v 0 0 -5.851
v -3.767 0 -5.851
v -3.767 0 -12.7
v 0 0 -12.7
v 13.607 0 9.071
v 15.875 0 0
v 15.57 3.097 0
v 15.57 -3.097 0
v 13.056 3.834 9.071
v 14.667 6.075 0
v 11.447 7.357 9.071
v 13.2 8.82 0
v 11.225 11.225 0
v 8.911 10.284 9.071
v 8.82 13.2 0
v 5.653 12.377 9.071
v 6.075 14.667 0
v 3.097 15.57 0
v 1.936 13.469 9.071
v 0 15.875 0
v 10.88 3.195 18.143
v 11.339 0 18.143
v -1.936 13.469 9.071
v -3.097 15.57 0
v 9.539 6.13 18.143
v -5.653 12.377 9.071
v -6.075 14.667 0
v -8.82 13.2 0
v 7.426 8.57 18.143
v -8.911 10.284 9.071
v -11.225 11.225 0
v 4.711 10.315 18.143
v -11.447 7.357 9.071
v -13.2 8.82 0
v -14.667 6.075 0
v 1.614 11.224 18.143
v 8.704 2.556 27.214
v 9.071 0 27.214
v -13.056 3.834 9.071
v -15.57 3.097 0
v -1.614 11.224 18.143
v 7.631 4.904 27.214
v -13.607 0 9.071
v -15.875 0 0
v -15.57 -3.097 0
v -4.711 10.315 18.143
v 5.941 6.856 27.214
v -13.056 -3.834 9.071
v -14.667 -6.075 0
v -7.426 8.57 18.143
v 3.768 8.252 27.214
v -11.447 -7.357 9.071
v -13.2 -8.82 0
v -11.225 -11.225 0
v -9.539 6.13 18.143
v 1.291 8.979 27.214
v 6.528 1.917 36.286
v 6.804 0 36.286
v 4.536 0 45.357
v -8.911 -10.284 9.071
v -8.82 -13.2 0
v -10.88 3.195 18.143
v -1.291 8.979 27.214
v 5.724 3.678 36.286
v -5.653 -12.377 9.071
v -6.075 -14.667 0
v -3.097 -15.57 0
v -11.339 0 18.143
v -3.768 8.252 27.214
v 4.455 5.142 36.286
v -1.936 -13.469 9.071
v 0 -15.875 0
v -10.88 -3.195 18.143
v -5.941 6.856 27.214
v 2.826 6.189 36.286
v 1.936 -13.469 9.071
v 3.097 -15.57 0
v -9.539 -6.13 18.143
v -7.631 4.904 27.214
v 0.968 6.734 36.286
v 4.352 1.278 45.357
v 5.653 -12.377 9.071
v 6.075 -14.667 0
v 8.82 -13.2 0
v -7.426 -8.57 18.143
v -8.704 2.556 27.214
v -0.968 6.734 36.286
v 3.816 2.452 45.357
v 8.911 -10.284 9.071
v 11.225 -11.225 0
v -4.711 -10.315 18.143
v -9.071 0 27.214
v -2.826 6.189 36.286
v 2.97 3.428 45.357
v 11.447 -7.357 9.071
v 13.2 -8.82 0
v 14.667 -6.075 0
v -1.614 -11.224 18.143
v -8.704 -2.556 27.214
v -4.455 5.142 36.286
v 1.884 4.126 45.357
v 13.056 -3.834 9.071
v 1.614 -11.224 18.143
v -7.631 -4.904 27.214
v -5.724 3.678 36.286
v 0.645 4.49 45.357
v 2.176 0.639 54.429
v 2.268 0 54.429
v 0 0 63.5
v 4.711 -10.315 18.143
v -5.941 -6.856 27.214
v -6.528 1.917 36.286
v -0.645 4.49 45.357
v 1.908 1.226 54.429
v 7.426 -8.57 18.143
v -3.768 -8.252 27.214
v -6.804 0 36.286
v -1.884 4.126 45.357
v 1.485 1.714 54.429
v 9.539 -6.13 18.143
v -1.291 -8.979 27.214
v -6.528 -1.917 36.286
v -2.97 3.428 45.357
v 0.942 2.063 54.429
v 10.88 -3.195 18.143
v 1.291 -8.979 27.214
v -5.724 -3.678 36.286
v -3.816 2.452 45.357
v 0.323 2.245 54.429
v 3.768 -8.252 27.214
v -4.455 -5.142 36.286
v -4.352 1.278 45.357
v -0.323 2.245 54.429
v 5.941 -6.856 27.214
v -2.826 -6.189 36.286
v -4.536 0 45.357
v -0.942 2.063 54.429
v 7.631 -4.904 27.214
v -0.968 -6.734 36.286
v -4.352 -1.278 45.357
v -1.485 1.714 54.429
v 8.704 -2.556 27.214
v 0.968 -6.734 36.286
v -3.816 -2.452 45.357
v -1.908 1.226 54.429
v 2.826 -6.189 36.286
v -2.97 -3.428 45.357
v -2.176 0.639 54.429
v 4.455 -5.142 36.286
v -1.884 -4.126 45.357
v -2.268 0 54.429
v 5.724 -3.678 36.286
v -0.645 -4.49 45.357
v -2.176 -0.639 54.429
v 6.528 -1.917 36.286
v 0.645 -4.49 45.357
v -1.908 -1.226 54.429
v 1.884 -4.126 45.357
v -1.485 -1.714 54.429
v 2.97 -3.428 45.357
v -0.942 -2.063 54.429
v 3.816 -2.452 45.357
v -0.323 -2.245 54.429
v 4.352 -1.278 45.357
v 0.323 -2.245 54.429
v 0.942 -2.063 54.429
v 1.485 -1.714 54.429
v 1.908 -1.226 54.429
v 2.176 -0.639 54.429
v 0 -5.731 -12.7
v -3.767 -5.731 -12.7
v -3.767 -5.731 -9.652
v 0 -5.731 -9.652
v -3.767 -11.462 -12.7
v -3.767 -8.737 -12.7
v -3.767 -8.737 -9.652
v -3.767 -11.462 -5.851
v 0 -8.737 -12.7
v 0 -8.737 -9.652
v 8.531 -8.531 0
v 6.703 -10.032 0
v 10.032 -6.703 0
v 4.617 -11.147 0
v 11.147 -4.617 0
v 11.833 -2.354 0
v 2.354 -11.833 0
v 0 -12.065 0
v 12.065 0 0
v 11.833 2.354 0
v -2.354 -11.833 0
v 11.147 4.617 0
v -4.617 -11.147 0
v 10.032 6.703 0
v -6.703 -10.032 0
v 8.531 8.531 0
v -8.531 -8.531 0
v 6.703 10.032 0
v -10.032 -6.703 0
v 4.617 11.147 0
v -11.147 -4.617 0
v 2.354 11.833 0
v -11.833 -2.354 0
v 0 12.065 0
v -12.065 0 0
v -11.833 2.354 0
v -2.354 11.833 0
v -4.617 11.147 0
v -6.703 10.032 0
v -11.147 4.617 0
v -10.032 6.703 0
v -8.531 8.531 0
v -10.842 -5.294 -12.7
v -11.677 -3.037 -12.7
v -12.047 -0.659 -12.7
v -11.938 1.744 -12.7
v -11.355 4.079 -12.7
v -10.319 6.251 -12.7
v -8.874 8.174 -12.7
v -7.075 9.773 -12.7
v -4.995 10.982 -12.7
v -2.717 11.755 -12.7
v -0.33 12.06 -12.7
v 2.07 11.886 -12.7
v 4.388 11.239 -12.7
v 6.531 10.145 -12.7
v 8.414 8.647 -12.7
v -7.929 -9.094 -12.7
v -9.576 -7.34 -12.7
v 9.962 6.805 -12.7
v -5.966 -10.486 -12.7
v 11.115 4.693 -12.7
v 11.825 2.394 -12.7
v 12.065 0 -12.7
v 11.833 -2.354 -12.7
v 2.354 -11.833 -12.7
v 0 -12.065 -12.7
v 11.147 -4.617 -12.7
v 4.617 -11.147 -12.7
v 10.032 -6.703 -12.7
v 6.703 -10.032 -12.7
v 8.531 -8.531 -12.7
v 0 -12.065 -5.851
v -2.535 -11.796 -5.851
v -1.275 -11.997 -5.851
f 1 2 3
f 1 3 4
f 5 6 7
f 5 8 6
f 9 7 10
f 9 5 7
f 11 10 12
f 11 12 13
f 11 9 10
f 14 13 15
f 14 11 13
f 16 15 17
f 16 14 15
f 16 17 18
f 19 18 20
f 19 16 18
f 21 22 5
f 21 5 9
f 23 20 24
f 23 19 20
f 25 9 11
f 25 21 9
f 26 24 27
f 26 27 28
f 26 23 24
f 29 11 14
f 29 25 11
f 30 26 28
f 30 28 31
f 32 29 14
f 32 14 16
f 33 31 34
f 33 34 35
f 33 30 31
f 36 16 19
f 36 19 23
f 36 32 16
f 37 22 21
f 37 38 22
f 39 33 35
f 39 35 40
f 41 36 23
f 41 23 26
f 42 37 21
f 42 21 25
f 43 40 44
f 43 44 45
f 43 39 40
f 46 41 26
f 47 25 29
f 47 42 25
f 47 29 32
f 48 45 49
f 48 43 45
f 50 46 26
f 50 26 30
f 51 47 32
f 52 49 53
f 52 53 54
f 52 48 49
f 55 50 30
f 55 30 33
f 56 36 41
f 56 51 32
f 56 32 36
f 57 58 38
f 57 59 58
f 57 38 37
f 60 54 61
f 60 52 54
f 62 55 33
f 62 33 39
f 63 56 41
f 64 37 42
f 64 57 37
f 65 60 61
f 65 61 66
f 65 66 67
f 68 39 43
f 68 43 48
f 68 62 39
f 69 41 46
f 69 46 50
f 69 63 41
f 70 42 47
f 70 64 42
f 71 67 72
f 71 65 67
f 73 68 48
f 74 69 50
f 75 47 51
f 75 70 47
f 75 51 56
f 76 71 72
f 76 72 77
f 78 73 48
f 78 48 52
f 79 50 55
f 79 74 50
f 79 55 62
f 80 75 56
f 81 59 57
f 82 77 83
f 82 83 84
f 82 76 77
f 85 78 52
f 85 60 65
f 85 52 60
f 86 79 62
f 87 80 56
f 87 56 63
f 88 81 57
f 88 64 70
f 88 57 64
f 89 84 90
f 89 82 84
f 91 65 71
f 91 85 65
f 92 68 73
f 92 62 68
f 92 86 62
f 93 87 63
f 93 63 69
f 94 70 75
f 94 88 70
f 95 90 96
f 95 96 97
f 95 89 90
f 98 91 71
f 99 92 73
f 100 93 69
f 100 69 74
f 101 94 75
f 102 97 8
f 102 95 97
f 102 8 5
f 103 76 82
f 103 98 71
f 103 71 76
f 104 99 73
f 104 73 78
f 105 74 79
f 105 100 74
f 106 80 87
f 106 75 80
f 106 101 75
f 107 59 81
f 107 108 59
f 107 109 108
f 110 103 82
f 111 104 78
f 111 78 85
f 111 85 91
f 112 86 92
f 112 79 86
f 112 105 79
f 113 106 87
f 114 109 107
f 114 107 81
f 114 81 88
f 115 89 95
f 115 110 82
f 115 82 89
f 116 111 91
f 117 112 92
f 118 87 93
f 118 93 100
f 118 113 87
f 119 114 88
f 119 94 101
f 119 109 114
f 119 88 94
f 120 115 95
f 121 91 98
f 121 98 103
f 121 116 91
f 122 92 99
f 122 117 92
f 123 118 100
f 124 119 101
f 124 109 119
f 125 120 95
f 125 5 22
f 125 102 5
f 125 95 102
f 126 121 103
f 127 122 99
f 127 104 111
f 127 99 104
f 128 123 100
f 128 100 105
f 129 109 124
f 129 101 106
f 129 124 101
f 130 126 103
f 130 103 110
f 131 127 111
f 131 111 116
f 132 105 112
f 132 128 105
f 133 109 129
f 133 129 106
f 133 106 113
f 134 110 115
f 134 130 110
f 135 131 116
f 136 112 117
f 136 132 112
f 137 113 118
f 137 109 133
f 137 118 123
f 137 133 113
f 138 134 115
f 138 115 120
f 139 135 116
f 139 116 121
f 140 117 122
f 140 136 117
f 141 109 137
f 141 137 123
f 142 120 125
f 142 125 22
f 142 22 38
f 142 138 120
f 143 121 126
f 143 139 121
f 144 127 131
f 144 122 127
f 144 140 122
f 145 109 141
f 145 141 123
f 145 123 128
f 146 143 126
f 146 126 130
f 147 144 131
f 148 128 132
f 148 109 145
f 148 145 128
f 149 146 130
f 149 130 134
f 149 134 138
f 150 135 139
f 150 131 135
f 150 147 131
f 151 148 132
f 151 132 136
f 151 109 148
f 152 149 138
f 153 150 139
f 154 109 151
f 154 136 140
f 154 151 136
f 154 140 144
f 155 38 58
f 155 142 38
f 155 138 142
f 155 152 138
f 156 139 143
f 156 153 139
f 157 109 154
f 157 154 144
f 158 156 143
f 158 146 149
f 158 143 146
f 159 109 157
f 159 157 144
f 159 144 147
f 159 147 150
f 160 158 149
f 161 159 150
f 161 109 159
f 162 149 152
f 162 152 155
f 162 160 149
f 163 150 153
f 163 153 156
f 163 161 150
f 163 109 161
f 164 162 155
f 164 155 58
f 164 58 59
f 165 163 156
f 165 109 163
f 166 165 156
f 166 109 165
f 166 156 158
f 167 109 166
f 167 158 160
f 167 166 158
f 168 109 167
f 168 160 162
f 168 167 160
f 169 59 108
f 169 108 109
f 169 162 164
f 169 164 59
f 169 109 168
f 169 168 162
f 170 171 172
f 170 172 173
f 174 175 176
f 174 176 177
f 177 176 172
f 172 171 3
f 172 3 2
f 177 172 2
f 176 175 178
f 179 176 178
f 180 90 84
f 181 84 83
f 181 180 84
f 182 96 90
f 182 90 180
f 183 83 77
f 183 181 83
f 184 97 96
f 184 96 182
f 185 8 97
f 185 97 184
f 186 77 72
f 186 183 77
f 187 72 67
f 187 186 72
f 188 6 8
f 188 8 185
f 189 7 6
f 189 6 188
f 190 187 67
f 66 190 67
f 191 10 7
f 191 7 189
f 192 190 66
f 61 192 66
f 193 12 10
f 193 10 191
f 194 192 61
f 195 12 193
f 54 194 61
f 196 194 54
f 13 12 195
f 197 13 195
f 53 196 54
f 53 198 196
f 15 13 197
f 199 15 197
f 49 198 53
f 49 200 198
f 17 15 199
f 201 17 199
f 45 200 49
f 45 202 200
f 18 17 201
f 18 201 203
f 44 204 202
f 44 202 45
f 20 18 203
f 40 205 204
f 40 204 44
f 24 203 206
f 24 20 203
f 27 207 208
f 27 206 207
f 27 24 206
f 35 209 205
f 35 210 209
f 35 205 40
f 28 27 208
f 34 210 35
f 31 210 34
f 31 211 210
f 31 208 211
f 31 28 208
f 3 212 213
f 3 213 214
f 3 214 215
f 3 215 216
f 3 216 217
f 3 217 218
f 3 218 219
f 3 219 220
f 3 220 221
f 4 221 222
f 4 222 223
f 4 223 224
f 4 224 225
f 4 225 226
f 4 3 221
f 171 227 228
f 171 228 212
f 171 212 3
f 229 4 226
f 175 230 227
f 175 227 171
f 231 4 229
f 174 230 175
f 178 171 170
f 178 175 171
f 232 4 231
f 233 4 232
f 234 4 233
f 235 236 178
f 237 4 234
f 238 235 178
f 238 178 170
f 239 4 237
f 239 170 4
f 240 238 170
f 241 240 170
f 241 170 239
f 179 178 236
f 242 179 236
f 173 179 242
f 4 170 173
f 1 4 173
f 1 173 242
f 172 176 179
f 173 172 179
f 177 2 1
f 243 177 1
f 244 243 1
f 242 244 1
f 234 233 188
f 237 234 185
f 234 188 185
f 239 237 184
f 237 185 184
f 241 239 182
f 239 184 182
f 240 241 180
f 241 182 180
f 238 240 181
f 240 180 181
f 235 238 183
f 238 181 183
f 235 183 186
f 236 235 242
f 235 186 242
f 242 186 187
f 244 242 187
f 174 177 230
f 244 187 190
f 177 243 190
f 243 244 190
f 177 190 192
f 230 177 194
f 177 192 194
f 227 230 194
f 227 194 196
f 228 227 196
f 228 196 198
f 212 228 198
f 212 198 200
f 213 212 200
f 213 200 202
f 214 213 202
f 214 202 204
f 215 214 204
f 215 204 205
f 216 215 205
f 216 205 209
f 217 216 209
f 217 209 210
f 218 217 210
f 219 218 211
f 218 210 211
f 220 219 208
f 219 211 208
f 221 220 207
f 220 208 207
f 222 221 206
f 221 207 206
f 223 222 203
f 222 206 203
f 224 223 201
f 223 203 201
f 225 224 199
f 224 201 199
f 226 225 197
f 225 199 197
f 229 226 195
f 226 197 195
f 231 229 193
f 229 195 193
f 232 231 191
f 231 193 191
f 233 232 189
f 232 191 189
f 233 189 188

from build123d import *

# Parameters (mm, degrees)
F2_R     = 12.065
F3_DEPTH = 12.7
F4_W     = 3.766847
F4_H     = 8.072342
F5_DEPTH = 12.7
F6_W     = 3.766847
F6_H     = 3.006206
F7_DEPTH = 3.048


with BuildPart() as f1:
    # F0 (on Front) → F1 (revolve)
    with BuildSketch(Plane.XZ):
        Polygon((0, 63.5), (0, 0), (15.875, 0), align=None)
    revolve(axis=Axis((0, 0, 31.75), (0, 0, 1)))

    # F2 (on face) → F3 (join)
    with BuildSketch(Plane(origin=(0, 0, 0), x_dir=(1, 0, 0), z_dir=(0, 0, -1))):
        Circle(F2_R)
    extrude(amount=F3_DEPTH)

    # F4 (on Front) → F5 (cut)
    with BuildSketch(Plane.XZ):
        with Locations((-1.883423, -9.887242)):
            Rectangle(F4_W, F4_H)
    extrude(amount=F5_DEPTH, mode=Mode.SUBTRACT)

    # F6 (on face) → F7 (join)
    with BuildSketch(Plane(origin=(0, 0, -12.7), x_dir=(1, 0, 0), z_dir=(0, 0, -1))):
        with Locations((-1.883423, 7.234052)):
            Rectangle(F6_W, F6_H)
    extrude(amount=-F7_DEPTH)


solid = f1.part
